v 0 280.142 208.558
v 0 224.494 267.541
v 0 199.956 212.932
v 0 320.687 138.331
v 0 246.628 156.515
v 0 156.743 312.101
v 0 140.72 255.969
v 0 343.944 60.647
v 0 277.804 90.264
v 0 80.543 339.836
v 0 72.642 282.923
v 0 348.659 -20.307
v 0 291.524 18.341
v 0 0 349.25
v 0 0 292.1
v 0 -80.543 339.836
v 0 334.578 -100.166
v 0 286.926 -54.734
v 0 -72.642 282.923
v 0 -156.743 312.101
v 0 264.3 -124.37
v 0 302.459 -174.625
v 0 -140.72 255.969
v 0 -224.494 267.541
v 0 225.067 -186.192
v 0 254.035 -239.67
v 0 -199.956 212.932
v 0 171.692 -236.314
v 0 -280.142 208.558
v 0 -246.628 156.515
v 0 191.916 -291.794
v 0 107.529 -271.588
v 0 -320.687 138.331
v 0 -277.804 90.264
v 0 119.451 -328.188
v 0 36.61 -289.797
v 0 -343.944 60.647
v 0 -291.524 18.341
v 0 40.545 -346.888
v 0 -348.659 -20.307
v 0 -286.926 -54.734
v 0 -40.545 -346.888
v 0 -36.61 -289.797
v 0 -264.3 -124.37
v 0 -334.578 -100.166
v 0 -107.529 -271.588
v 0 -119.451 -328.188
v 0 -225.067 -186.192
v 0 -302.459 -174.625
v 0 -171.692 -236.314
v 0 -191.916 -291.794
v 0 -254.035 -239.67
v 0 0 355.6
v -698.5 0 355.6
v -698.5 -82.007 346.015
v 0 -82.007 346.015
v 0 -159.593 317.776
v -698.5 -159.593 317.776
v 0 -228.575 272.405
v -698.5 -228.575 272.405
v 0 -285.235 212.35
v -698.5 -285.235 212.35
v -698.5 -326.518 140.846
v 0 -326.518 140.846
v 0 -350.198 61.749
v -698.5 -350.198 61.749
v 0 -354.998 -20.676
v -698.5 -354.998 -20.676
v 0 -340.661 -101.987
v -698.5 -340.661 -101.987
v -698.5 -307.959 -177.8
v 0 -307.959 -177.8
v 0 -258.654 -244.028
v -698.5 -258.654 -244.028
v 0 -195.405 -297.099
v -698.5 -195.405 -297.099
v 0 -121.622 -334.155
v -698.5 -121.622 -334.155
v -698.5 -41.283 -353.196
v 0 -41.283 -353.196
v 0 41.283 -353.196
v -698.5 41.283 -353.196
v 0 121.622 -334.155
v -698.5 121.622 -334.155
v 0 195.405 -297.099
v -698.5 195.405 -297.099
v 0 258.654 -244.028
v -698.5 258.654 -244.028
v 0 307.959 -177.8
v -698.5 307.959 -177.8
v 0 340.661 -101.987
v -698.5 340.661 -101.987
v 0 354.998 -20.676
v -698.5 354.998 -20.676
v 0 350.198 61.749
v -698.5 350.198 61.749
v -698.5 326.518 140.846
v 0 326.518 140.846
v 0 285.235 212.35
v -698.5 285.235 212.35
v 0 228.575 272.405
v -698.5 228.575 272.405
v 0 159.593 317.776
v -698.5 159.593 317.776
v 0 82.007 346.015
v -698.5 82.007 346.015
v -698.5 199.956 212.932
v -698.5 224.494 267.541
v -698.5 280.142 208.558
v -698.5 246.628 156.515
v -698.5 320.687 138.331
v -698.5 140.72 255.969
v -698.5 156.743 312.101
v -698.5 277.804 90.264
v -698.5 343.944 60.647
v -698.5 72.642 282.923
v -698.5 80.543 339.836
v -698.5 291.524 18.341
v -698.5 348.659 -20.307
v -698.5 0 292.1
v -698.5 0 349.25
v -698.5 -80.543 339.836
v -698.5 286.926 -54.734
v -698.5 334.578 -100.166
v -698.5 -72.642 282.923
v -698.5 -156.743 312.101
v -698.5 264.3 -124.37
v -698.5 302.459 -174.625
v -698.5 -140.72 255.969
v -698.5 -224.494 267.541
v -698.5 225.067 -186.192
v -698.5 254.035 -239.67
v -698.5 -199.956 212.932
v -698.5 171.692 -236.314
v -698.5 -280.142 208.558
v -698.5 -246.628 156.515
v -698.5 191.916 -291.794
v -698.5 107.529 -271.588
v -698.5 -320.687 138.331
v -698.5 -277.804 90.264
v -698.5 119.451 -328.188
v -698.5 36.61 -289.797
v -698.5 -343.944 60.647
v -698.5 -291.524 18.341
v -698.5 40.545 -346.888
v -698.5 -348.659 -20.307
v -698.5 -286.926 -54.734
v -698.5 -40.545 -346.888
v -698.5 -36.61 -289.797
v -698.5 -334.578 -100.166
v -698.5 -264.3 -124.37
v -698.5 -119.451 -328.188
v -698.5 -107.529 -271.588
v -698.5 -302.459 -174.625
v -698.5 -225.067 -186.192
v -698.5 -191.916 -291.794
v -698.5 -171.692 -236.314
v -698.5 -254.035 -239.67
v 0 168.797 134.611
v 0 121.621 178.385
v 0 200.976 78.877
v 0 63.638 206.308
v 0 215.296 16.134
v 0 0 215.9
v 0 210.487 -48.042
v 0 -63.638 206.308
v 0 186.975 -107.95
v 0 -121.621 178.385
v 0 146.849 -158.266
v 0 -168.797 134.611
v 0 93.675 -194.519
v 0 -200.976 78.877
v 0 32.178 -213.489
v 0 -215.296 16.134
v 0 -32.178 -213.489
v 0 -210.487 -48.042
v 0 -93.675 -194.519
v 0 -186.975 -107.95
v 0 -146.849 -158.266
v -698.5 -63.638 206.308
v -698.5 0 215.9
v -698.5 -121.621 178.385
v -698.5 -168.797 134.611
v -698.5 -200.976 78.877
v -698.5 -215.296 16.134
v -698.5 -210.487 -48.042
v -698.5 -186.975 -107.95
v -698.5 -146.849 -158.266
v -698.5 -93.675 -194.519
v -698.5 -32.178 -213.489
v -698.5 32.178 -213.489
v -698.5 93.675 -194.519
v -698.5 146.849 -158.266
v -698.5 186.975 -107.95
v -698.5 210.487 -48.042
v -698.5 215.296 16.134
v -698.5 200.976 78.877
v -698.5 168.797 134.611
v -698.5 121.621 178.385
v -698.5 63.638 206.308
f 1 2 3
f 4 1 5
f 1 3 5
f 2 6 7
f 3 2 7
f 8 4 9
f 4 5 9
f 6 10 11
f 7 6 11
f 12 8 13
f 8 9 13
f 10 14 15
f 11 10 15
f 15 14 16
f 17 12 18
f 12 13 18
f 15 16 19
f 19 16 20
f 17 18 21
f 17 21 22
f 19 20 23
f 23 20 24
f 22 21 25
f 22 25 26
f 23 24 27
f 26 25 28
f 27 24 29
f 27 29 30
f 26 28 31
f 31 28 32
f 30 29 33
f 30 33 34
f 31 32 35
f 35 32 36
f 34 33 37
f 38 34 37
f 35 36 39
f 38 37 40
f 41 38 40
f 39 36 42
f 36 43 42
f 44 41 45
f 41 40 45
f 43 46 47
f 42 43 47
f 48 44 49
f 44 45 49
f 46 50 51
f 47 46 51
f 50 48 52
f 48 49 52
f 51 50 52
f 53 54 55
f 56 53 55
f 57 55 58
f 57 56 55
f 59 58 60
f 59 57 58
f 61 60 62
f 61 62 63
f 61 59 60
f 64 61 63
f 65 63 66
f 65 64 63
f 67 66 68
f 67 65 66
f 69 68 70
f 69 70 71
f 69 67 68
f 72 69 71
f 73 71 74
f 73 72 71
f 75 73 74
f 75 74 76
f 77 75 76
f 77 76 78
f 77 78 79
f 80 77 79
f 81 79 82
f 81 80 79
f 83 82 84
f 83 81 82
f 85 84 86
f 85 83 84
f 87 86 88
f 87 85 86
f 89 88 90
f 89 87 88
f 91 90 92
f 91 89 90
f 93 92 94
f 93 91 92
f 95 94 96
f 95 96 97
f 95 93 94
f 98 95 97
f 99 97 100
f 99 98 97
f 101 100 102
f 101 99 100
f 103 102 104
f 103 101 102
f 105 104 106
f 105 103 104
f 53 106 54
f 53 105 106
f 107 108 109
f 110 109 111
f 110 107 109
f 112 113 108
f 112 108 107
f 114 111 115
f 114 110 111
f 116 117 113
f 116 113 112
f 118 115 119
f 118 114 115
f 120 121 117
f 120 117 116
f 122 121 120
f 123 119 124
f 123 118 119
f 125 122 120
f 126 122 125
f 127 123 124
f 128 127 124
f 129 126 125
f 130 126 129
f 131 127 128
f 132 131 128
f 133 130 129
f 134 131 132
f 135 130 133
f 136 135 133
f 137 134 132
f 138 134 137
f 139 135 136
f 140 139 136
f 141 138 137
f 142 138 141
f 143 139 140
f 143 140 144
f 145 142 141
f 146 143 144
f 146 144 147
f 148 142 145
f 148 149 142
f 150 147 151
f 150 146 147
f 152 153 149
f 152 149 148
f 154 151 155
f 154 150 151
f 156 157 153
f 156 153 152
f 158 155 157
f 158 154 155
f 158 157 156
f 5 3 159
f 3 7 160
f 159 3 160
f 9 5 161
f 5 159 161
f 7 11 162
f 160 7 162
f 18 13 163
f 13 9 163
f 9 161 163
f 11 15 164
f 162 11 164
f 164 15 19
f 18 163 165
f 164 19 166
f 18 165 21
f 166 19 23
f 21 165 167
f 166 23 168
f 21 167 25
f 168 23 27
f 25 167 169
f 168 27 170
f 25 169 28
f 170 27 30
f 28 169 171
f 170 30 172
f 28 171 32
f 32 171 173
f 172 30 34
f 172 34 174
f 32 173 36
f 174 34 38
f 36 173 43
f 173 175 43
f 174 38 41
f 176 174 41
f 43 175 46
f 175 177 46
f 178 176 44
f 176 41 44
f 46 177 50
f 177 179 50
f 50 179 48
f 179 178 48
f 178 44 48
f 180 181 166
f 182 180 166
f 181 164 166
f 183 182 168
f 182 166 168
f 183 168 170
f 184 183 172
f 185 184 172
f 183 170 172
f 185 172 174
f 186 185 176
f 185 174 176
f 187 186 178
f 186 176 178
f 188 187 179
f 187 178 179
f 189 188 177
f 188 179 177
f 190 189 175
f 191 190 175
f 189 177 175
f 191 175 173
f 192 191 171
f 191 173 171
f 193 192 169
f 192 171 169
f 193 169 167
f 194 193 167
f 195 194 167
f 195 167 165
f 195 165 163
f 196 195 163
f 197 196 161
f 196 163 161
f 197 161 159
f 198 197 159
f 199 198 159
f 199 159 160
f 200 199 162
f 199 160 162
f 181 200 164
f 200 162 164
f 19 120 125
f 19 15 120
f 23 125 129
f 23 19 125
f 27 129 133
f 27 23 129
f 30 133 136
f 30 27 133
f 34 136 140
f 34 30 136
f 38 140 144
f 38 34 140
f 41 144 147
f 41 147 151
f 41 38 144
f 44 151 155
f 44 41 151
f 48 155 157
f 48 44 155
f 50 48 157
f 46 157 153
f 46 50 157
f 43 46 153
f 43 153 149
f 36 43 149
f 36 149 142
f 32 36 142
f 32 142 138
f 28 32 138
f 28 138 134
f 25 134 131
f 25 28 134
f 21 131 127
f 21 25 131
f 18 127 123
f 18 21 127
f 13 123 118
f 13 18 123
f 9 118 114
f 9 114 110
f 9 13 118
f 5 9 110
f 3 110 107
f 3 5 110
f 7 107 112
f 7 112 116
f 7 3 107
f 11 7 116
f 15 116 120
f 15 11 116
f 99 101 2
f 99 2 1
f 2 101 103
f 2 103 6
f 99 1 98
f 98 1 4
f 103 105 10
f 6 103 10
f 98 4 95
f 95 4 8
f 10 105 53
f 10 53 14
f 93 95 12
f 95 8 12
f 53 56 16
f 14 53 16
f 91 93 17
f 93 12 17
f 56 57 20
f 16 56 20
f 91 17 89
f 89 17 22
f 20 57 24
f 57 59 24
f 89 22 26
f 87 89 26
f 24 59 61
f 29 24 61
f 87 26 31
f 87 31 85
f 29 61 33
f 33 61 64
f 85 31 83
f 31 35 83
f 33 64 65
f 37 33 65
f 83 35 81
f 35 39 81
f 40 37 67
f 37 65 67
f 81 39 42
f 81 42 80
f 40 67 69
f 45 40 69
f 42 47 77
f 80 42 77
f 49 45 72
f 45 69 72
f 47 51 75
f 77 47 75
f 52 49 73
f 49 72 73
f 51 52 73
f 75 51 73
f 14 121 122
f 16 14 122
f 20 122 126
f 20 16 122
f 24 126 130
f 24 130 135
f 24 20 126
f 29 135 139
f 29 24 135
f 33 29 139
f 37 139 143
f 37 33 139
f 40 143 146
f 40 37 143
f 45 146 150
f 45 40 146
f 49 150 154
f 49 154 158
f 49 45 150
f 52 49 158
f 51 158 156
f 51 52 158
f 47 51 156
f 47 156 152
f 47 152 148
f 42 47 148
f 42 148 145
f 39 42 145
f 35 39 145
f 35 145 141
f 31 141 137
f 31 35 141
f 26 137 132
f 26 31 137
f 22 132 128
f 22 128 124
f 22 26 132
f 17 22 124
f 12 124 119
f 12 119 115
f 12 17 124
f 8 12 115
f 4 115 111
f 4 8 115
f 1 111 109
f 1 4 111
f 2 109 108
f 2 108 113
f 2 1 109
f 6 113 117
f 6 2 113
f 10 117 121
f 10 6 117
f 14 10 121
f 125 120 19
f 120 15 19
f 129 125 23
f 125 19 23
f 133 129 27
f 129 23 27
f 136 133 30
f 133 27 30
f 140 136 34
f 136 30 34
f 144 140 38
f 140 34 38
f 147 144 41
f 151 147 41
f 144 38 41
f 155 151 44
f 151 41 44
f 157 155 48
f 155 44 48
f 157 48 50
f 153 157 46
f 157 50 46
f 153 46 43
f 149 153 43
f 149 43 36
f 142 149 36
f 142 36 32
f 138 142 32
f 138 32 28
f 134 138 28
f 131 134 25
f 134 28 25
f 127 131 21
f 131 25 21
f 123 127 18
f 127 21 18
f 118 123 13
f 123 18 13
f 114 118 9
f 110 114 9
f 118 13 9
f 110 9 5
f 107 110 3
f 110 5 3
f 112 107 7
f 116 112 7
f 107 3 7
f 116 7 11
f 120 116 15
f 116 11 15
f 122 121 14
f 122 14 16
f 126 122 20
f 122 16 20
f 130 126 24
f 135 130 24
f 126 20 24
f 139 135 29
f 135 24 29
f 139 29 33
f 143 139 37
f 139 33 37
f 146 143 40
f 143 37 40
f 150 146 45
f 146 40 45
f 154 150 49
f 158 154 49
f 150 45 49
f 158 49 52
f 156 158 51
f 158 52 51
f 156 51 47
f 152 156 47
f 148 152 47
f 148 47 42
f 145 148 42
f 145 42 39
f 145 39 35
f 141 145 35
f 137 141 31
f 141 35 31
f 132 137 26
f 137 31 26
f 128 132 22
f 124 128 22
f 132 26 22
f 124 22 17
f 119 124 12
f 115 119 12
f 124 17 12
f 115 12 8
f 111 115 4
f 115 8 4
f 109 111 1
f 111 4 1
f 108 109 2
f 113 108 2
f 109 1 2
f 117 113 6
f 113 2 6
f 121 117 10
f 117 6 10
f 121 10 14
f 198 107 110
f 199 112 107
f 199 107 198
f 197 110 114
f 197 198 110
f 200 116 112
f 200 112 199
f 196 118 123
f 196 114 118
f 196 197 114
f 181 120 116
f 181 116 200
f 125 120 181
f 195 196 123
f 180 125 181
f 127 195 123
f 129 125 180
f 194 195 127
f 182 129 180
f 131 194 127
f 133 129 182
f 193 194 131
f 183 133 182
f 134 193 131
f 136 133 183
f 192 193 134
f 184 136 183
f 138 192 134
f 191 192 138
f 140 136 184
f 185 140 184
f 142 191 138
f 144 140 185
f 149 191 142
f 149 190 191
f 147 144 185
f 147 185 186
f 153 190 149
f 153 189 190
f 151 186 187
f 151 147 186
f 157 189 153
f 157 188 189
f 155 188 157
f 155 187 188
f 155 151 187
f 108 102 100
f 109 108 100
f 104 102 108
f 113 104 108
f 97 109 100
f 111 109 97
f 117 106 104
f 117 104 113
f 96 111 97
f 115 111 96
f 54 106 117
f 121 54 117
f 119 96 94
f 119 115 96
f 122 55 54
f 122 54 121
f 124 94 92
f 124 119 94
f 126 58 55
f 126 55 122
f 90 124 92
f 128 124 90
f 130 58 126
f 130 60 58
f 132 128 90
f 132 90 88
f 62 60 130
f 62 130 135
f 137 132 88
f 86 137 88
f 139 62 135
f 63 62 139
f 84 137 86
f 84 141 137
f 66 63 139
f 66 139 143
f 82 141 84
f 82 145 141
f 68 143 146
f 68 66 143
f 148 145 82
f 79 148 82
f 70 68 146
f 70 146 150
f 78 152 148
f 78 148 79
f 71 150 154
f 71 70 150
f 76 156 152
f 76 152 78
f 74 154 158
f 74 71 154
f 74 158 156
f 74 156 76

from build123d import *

# Parameters (mm, degrees)
F0_W   = 698.5
F0_H   = 6.35
F0_H_2 = 57.15
F0_H_3 = 76.2


with BuildPart() as f1:
    # F0 (on Front) → F1 (revolve)
    with BuildSketch(Plane.XZ):
        with Locations((-349.25, 352.425)):
            Rectangle(F0_W, F0_H)
    revolve(axis=Axis((5.301379, 0, 0), (1, 0, 0)))


with BuildPart() as f2:
    # F0 (on Front) → F2 (revolve)
    with BuildSketch(Plane.XZ):
        with Locations((-349.25, 320.675)):
            Rectangle(F0_W, F0_H_2)
    revolve(axis=Axis((5.301379, 0, 0), (1, 0, 0)))


with BuildPart() as f3:
    # F0 (on Front) → F3 (revolve)
    with BuildSketch(Plane.XZ):
        with Locations((-349.25, 254)):
            Rectangle(F0_W, F0_H_3)
    revolve(axis=Axis((5.301379, 0, 0), (1, 0, 0)))


solid = Compound([f1.part, f2.part, f3.part])
